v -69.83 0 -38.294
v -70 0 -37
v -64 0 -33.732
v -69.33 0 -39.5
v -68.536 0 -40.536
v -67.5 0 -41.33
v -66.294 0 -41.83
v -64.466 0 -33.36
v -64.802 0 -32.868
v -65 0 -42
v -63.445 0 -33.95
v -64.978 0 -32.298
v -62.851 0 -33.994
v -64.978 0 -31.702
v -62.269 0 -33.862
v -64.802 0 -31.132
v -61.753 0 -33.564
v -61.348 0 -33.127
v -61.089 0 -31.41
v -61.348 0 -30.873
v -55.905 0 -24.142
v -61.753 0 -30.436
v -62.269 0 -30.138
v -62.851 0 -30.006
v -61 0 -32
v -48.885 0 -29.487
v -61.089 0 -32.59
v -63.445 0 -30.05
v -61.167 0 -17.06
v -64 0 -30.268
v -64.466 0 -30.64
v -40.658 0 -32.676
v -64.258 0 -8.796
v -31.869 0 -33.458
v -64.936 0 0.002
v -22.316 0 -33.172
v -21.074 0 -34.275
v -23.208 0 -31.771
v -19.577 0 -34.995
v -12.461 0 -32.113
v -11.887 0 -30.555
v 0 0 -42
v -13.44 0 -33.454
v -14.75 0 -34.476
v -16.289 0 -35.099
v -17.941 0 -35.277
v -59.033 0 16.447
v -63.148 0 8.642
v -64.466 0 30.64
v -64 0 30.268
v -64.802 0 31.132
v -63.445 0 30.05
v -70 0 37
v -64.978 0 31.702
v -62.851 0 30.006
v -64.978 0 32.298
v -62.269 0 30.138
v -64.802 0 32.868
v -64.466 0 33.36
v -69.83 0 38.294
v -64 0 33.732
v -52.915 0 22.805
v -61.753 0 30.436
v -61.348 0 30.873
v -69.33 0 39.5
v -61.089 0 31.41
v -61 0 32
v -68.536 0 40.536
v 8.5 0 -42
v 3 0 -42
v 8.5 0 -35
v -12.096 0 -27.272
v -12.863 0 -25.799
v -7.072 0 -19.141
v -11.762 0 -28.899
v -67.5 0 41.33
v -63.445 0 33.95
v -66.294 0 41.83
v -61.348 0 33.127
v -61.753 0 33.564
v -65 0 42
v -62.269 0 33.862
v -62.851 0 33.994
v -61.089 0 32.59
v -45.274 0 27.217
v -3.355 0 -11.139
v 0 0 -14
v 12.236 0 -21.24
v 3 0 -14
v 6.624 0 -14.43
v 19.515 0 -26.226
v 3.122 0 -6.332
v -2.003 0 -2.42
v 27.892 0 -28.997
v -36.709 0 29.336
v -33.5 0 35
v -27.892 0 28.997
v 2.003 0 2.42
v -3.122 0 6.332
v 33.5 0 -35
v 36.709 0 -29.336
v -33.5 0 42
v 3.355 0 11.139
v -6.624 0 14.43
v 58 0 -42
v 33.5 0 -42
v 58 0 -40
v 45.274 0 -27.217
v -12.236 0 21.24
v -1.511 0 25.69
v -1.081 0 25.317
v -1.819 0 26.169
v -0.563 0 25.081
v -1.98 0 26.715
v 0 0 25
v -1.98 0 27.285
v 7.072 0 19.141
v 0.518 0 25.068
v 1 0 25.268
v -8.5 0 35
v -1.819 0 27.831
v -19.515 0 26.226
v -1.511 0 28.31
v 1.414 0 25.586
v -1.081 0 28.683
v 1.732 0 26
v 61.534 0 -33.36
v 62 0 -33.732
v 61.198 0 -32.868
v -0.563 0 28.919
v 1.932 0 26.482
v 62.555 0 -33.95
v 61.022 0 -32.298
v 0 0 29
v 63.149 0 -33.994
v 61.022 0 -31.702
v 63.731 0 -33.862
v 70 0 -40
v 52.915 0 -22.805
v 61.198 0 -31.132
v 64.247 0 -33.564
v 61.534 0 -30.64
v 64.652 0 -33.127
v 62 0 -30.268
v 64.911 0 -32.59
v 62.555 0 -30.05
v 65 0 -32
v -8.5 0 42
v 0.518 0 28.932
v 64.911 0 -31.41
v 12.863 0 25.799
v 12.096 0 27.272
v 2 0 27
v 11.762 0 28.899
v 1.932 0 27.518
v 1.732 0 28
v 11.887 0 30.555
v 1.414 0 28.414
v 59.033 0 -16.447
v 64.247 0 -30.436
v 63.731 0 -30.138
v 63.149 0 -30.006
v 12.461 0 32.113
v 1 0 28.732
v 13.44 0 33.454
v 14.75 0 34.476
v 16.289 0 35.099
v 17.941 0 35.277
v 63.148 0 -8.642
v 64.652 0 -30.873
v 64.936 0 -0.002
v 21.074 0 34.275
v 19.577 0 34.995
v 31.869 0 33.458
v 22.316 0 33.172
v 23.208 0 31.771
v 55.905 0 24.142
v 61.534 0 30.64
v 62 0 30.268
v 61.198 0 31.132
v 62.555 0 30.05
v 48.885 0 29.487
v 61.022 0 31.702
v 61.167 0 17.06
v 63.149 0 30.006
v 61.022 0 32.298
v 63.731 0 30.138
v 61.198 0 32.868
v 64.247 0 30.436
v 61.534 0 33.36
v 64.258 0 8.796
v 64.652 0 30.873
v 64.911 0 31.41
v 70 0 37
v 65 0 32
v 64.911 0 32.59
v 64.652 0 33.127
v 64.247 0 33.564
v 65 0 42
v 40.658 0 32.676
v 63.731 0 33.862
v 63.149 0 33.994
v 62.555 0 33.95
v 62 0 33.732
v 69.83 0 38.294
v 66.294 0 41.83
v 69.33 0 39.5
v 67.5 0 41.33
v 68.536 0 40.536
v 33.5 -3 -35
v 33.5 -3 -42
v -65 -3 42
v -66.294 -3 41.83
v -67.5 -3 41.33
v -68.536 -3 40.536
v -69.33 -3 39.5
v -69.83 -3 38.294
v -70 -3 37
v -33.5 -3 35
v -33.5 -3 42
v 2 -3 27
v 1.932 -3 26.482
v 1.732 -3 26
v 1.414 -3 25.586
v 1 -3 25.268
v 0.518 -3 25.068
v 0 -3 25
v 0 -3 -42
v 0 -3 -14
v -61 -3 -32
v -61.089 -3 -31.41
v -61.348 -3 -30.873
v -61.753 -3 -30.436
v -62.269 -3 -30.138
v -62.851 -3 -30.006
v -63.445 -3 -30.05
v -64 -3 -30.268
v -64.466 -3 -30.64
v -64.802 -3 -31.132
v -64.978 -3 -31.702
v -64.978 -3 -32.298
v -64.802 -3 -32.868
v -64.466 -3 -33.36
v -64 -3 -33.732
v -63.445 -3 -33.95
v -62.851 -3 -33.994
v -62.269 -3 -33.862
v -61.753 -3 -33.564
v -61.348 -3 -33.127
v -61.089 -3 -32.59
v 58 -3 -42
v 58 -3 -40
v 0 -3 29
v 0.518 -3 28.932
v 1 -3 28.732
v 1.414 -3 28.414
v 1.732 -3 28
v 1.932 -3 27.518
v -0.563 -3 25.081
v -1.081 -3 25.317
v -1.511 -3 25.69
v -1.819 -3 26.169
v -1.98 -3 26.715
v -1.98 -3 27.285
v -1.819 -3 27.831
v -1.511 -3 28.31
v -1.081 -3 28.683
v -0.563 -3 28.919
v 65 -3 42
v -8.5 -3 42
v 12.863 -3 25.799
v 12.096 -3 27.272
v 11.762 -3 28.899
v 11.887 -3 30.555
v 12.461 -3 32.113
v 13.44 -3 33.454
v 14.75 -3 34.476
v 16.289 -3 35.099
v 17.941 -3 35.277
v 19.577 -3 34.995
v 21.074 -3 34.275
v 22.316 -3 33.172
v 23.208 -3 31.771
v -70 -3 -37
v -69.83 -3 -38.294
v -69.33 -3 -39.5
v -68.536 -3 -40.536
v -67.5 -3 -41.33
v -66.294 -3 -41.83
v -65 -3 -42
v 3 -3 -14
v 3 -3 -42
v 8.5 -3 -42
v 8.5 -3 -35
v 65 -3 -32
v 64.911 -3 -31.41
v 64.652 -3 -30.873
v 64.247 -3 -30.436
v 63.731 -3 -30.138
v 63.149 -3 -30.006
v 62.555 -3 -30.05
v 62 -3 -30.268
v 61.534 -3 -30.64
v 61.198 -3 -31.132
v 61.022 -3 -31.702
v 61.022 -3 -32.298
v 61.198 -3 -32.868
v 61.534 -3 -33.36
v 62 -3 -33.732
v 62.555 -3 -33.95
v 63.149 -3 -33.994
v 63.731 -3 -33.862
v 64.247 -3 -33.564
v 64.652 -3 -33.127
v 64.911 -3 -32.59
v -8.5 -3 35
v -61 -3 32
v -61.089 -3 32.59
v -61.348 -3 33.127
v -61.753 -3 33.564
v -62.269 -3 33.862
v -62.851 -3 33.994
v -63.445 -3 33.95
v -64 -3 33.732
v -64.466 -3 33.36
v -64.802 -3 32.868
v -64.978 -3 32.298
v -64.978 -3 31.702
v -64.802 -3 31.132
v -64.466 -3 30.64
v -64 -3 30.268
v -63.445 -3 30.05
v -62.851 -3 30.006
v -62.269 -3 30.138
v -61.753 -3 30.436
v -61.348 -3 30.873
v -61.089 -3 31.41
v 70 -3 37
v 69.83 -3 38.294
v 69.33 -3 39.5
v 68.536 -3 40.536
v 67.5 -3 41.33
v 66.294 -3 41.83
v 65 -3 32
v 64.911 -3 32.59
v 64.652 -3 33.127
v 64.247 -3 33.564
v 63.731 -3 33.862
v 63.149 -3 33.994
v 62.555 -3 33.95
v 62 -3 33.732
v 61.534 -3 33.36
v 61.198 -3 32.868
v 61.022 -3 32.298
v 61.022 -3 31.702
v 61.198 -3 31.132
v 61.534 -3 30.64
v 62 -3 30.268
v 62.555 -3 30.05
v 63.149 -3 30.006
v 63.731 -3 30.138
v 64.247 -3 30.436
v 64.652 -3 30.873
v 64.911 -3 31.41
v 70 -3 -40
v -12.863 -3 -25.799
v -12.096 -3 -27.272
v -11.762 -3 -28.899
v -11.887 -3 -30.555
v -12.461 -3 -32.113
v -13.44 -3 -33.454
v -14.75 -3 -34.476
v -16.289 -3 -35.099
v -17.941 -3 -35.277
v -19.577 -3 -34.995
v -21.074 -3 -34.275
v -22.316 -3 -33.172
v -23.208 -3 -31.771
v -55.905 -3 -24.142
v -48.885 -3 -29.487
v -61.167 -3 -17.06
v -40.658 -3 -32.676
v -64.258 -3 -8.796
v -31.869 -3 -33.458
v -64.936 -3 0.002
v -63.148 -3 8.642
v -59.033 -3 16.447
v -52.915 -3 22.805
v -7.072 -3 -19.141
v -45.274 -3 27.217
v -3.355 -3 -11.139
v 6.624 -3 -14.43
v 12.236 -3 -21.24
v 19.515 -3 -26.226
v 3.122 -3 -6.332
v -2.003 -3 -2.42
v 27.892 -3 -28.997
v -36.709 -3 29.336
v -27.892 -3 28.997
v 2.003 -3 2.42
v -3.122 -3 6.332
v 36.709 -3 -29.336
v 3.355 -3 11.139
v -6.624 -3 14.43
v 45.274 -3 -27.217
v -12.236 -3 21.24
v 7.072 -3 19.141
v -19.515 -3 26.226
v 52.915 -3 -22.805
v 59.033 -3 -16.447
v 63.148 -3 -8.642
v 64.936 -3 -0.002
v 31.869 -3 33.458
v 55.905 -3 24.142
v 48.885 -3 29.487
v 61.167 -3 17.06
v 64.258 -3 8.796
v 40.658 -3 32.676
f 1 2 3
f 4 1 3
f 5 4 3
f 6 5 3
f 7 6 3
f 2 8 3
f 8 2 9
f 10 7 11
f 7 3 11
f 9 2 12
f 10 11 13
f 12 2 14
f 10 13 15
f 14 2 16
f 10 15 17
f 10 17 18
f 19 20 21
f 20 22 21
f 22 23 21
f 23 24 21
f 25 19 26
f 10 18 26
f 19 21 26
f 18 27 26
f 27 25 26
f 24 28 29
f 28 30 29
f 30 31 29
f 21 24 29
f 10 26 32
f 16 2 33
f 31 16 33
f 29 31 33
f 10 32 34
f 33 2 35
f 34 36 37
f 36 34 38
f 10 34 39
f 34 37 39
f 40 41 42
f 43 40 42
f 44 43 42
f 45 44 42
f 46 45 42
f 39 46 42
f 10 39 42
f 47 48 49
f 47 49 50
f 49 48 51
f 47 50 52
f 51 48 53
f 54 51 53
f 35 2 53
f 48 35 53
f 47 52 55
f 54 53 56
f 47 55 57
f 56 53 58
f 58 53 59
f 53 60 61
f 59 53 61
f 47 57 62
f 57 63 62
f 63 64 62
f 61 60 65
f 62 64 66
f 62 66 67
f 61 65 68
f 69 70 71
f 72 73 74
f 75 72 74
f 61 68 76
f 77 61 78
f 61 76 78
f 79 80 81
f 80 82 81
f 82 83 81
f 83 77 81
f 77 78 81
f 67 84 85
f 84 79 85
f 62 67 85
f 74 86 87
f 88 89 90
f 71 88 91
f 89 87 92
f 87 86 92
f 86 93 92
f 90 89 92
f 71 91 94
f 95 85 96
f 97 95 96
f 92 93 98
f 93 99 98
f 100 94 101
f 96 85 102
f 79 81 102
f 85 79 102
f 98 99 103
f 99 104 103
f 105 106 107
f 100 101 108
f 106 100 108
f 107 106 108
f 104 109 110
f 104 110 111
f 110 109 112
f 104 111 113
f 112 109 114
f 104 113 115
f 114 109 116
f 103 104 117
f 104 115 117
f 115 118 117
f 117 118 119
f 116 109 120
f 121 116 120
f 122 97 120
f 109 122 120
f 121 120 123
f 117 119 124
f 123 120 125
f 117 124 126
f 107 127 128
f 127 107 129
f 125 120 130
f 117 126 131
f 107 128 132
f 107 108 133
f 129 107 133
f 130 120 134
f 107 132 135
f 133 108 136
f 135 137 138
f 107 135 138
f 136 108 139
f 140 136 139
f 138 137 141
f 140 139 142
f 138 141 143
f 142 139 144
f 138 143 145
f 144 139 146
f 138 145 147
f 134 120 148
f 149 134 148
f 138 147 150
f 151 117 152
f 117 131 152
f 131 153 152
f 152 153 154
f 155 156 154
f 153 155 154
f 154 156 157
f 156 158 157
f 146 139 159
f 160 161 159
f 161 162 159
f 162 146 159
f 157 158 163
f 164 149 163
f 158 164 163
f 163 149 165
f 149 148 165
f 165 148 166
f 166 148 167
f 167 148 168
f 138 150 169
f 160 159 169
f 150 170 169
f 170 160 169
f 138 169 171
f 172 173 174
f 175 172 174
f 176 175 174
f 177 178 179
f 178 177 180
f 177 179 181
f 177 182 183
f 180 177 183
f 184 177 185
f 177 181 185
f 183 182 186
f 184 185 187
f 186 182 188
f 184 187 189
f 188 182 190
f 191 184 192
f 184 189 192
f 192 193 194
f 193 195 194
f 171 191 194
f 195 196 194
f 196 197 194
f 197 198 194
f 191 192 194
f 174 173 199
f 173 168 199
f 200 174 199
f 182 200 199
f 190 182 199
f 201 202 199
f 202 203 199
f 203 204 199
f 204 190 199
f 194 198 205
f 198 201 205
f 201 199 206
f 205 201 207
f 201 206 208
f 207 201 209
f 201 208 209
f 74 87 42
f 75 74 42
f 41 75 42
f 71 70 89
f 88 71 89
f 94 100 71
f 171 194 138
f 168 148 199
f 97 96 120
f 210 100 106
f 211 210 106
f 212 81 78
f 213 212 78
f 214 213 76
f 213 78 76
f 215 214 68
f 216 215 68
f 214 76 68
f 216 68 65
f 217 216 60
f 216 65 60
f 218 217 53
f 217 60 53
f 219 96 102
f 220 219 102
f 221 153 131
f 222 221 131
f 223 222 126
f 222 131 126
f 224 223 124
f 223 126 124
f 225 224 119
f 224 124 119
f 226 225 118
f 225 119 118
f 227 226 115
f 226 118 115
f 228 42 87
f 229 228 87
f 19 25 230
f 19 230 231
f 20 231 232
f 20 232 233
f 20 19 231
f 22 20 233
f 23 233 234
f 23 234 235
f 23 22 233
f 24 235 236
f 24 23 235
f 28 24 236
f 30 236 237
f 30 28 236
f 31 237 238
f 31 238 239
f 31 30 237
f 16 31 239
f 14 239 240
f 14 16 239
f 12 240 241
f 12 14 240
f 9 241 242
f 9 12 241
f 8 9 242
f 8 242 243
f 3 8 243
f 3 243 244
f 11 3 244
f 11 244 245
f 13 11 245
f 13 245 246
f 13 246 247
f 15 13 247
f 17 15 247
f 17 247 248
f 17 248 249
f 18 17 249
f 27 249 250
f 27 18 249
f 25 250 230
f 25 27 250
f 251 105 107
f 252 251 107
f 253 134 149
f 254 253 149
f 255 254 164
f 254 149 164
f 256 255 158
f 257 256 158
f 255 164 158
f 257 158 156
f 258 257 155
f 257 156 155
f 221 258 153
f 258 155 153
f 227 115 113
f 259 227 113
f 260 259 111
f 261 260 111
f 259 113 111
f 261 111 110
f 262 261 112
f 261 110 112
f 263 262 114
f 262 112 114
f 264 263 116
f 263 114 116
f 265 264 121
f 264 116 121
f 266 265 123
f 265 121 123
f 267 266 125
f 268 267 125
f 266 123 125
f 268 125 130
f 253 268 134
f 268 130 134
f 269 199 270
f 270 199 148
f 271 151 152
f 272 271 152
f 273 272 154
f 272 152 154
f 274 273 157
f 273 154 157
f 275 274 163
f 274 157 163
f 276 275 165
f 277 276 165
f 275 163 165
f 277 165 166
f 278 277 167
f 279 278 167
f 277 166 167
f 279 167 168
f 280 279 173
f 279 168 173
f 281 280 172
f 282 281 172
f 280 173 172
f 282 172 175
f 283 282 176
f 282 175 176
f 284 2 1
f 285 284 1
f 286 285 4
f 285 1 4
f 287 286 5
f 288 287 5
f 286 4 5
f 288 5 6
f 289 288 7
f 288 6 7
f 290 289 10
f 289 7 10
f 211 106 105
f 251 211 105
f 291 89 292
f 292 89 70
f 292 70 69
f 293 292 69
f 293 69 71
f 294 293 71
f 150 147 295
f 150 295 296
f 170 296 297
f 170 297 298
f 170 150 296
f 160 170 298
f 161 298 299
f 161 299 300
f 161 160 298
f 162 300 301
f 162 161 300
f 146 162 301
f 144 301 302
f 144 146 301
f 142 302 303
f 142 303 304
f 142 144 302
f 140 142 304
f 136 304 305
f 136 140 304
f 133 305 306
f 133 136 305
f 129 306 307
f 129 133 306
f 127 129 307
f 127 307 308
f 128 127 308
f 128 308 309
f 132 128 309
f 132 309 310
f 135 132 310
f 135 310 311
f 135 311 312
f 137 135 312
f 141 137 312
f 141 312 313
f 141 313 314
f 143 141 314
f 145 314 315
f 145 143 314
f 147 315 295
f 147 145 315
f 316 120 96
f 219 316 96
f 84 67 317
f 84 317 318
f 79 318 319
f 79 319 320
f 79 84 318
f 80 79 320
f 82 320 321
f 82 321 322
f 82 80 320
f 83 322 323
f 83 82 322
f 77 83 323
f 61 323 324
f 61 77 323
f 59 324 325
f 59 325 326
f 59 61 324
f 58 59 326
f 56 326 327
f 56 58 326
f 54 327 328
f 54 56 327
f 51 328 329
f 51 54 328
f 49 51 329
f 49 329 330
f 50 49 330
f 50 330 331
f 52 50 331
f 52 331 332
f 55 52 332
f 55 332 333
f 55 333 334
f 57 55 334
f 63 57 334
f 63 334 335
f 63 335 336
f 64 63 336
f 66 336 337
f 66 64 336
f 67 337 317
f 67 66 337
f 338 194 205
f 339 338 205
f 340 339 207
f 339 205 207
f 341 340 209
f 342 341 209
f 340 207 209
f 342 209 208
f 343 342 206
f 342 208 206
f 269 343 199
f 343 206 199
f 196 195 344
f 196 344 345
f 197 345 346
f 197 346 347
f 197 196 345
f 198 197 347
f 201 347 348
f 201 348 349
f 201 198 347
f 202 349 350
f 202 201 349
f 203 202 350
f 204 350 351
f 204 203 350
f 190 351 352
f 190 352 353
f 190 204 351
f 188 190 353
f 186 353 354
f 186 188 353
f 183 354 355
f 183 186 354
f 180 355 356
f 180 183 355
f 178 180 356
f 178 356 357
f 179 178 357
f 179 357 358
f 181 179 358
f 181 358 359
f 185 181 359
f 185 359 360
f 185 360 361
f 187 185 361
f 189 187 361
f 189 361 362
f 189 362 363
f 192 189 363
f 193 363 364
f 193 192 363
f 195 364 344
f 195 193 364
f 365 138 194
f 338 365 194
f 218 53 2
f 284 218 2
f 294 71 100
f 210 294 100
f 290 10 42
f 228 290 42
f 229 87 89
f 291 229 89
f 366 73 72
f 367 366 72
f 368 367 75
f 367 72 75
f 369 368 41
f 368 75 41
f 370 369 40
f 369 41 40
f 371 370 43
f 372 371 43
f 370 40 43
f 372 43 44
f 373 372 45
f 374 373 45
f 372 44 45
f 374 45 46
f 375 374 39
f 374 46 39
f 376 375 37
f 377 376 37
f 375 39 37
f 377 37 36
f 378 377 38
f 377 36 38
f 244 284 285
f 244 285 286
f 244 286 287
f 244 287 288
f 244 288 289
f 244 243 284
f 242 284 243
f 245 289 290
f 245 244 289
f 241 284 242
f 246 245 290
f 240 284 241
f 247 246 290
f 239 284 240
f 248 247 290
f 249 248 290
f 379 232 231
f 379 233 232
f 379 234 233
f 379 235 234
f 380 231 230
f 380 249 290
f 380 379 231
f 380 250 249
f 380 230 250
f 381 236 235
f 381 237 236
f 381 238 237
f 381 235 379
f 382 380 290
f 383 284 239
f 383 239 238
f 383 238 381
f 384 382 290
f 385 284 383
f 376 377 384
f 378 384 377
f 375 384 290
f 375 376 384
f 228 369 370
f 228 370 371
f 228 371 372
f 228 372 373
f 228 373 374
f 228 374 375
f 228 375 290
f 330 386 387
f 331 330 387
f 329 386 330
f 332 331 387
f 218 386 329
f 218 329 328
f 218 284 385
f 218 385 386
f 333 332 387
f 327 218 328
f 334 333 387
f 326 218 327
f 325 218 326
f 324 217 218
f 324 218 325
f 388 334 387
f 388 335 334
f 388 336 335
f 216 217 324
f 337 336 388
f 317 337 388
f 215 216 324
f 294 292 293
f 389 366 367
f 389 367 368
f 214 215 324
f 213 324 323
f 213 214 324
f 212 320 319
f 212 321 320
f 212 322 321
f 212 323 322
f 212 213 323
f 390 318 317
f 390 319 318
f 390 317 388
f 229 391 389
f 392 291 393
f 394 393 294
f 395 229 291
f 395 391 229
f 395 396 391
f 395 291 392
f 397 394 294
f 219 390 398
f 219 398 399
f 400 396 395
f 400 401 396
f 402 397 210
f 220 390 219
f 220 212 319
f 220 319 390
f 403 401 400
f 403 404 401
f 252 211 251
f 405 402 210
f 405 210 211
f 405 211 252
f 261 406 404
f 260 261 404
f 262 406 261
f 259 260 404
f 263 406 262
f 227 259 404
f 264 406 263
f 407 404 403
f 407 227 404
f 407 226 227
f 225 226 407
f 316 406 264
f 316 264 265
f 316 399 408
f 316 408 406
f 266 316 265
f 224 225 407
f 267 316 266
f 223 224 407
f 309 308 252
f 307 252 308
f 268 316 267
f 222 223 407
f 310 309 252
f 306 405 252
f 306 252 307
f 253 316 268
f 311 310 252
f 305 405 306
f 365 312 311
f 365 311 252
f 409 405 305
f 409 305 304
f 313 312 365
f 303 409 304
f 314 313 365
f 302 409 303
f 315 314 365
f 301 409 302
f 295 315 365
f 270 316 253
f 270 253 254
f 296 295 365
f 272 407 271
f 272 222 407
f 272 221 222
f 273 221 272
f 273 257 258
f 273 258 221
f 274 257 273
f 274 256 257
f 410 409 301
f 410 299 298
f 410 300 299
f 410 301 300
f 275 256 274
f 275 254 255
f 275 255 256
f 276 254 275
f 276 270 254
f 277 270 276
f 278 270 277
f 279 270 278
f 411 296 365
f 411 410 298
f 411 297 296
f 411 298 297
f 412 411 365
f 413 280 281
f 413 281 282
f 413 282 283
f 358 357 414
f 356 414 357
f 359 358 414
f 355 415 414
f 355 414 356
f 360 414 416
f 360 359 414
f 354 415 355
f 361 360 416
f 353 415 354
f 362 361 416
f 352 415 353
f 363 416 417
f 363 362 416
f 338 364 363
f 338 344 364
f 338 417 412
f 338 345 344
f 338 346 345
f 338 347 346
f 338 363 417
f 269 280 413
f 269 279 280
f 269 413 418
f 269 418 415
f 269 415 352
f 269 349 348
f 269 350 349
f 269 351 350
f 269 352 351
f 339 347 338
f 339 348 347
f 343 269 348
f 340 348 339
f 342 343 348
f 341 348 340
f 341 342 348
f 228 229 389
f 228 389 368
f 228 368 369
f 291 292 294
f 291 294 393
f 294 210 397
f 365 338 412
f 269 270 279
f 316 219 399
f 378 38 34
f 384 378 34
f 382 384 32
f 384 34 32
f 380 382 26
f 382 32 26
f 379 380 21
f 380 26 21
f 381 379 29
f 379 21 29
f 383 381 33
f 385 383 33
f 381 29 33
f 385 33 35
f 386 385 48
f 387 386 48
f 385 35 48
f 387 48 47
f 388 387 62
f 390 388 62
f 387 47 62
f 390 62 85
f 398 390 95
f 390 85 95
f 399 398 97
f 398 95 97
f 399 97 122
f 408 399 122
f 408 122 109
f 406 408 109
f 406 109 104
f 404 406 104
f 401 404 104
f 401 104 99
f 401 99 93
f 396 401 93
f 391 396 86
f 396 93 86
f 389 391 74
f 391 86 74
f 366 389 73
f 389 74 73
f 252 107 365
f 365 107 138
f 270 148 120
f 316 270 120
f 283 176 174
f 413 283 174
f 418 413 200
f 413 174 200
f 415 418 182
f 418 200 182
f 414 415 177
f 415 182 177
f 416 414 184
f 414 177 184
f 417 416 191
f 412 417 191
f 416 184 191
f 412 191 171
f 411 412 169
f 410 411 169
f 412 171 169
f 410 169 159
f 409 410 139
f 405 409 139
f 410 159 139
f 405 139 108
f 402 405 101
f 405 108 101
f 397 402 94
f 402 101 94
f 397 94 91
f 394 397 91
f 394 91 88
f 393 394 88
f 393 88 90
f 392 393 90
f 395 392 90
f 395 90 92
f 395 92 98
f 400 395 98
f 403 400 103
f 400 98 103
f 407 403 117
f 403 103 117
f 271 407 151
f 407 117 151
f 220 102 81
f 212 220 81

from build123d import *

# Parameters (mm, degrees)
F0_R     = 2
F1_DEPTH = 3


with BuildPart() as f1:
    # F0 (on Front) → F1 (new body)
    with BuildSketch(Plane.XZ):
        with BuildLine():
            ThreePointArc((-70, -37), (-68.535534, -40.535534), (-65, -42))
            Line((-65, -42), (0, -42))
            Line((0, -42), (0, -14))
            Line((0, -14), (0, 25))
            ThreePointArc((0, 25), (-2, 27), (0, 29))
            Line((0, 29), (0, 42))
            Line((0, 42), (-8.5, 42))
            Line((-8.5, 42), (-8.5, 35))
            Line((-8.5, 35), (-33.5, 35))
            Line((-33.5, 35), (-33.5, 42))
            Line((-33.5, 42), (-65, 42))
            ThreePointArc((-65, 42), (-68.535534, 40.535534), (-70, 37))
            Line((-70, 37), (-70, -37))
        make_face()
        with Locations((-63, -32)):
            Circle(F0_R, mode=Mode.SUBTRACT)
        with BuildLine():
            ThreePointArc((-23.208248, -31.771292), (-49.25, 25.2798), (-12.863181, -25.798565))
            ThreePointArc((-12.863181, -25.798565), (-14.75, -34.475953), (-23.208248, -31.771292))
        make_face(mode=Mode.SUBTRACT)
        with Locations((-63, 32)):
            Circle(F0_R, mode=Mode.SUBTRACT)
        with BuildLine():
            Line((0, 25), (0, -14))
            Line((0, -14), (3, -14))
            Line((3, -14), (3, -42))
            Line((3, -42), (8.5, -42))
            Line((8.5, -42), (8.5, -35))
            Line((8.5, -35), (33.5, -35))
            Line((33.5, -35), (33.5, -42))
            Line((33.5, -42), (58, -42))
            Line((58, -42), (58, -40))
            Line((58, -40), (70, -40))
            Line((70, -40), (70, 37))
            ThreePointArc((70, 37), (68.535534, 40.535534), (65, 42))
            Line((65, 42), (0, 42))
            Line((0, 42), (0, 29))
            ThreePointArc((0, 29), (1.414214, 28.414214), (2, 27))
            ThreePointArc((2, 27), (1.414214, 25.585786), (0, 25))
        make_face()
        with Locations((63, -32)):
            Circle(F0_R, mode=Mode.SUBTRACT)
        with BuildLine():
            ThreePointArc((23.208248, 31.771292), (49.25, -25.2798), (12.863181, 25.798565))
            ThreePointArc((12.863181, 25.798565), (14.75, 34.475953), (23.208248, 31.771292))
        make_face(mode=Mode.SUBTRACT)
        with Locations((63, 32)):
            Circle(F0_R, mode=Mode.SUBTRACT)
    extrude(amount=F1_DEPTH)


solid = f1.part
